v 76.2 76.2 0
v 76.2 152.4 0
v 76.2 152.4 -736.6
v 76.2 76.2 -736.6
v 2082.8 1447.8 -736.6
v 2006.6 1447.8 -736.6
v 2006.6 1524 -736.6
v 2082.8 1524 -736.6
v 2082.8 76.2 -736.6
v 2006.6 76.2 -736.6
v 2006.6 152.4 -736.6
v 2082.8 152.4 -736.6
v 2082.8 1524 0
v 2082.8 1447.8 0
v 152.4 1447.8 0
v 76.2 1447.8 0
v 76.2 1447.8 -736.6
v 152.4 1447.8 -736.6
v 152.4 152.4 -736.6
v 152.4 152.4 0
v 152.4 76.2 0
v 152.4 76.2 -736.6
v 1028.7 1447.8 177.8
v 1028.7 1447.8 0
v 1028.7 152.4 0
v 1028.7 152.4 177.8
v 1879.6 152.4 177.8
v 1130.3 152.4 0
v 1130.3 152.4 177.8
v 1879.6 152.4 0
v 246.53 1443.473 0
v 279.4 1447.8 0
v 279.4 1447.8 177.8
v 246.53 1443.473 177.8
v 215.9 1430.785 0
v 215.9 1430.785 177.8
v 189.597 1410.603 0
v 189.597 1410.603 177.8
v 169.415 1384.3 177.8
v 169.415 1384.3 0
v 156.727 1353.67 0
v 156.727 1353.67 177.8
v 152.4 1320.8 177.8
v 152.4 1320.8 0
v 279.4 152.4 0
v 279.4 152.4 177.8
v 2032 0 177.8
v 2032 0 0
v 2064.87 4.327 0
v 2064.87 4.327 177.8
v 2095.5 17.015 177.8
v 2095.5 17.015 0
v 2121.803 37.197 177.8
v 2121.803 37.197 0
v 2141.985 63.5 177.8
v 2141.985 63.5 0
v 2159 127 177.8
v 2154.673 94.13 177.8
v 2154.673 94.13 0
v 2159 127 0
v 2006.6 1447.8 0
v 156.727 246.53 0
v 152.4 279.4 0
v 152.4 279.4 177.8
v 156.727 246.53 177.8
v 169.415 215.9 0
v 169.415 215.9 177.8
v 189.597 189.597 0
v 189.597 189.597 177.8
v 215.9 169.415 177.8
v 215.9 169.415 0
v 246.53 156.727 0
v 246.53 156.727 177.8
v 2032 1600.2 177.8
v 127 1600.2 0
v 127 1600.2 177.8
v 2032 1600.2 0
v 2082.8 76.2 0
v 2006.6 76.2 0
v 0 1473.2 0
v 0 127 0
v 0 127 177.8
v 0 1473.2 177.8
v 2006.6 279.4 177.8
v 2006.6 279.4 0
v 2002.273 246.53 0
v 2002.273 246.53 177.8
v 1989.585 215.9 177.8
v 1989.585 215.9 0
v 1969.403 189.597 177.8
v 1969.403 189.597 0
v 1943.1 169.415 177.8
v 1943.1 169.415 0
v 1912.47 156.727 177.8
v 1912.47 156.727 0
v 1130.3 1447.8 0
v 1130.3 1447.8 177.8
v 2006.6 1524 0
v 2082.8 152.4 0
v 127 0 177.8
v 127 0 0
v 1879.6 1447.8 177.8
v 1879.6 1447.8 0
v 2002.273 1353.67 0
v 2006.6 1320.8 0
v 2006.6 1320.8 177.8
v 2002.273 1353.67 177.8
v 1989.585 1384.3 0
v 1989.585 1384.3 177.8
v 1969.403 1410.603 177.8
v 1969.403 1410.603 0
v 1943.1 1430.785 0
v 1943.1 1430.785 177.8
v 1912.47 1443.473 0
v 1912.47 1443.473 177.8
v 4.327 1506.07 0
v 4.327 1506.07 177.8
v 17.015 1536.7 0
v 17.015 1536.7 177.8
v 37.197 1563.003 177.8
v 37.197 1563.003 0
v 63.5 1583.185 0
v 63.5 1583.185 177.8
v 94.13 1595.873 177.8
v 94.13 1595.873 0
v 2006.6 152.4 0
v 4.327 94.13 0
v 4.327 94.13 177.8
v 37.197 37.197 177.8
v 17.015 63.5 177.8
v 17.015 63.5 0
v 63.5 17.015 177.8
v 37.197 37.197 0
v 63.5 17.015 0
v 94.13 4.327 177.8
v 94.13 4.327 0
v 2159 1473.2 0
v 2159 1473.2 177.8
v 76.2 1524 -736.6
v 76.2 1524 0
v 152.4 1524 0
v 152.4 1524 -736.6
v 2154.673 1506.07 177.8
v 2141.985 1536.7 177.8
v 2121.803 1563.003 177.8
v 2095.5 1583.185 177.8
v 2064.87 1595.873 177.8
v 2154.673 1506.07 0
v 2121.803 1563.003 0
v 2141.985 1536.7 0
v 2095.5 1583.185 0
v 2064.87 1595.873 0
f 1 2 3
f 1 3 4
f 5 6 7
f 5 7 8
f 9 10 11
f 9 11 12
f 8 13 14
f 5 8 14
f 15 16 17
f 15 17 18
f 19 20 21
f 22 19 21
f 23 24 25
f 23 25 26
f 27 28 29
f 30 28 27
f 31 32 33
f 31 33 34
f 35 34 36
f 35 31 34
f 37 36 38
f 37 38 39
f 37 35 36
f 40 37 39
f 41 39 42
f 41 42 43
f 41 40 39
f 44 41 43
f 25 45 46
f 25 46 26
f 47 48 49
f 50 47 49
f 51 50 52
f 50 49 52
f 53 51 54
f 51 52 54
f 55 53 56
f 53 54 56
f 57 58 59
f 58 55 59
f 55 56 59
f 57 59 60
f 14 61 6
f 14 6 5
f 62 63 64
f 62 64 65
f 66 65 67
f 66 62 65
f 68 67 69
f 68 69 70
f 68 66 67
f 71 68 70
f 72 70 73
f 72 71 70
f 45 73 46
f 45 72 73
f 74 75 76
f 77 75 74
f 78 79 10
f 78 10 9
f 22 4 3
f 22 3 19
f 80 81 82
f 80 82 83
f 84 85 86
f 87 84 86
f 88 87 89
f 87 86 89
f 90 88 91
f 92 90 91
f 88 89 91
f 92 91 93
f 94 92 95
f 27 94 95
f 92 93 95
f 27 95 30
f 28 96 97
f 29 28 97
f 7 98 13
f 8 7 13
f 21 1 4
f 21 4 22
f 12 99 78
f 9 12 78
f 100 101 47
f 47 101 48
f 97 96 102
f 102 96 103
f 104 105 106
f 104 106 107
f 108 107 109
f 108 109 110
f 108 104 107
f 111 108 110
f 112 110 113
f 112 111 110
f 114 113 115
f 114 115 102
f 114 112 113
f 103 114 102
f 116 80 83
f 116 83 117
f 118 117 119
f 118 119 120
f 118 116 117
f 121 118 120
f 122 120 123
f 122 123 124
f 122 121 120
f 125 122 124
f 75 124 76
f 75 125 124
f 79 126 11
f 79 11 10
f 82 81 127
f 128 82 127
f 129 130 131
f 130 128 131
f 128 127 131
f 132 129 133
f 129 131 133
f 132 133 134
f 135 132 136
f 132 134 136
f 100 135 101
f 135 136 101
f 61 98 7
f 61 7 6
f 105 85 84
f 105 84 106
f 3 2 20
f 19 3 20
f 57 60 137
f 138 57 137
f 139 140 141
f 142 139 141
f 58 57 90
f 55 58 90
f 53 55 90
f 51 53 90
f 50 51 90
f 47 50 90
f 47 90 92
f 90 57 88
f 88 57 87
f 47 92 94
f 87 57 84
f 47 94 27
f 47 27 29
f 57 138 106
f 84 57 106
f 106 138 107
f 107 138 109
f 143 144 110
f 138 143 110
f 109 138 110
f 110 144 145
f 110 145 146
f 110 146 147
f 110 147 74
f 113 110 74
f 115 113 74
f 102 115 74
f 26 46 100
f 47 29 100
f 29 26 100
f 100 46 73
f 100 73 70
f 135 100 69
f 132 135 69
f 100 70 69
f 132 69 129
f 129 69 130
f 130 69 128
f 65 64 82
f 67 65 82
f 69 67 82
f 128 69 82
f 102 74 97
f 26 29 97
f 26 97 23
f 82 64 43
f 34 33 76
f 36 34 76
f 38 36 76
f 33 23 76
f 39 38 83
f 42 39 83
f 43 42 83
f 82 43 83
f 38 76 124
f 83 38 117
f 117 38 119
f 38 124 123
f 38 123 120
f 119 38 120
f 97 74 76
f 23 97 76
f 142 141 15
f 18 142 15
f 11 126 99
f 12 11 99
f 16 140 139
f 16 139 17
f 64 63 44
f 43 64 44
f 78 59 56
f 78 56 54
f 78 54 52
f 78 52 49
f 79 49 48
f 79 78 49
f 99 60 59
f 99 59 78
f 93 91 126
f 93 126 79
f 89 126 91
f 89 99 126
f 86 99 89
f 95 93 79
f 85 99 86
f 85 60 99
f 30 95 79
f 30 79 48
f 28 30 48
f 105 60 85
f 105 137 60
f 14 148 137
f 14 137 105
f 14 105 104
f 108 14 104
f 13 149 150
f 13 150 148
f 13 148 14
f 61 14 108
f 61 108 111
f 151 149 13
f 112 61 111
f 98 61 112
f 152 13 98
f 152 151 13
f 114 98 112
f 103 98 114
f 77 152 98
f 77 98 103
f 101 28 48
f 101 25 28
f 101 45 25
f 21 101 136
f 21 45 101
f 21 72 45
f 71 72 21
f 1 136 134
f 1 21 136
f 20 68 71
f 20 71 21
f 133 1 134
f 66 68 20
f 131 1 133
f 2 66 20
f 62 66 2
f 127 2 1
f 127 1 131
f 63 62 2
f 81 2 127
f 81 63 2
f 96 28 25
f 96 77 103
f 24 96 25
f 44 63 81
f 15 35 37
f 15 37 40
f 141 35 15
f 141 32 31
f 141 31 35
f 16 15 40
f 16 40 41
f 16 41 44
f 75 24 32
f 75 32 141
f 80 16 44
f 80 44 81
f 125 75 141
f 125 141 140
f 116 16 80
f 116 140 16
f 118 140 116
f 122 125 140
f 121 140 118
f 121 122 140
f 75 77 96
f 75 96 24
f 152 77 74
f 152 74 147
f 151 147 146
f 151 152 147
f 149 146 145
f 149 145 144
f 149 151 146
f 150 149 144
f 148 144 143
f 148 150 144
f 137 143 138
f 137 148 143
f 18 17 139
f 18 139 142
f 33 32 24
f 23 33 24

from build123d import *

# Parameters (mm, degrees)
F0_W        = 2159
F0_H        = 1600.2
F0_W_2      = 1854.2
F0_H_2      = 1295.4
F1_DEPTH    = 177.8
F2_W        = 76.2
F2_H        = 76.2
F3_DEPTH    = 736.6
F4_T1_DEPTH = 177.8
F4_T3_DEPTH = 812.8
F5_W        = 101.6
F5_H        = 177.8
F6_DEPTH    = 1295.4


# Not quite as in the source:
# - a fillet or chamfer that OpenCascade refuses, or shapes differently, is made with other operations: its cross-section is extruded or revolved along the edge and cut away or added


with BuildPart() as f1:
    # F0 (on Top) → F1 (new body)
    with BuildSketch(Plane.XY):
        with Locations((1079.5, 800.1)):
            Rectangle(F0_W, F0_H)
        with Locations((1079.5, 800.1)):
            Rectangle(F0_W_2, F0_H_2, mode=Mode.SUBTRACT)
    extrude(amount=F1_DEPTH)

    # F2 (on face) → F3 (join)
    with BuildSketch(Plane(origin=(0, 0, 0), x_dir=(1, 0, 0), z_dir=(0, 0, -1))):
        with Locations((114.3, -114.3)):
            Rectangle(F2_W, F2_H)
        with Locations((2044.7, -114.3)):
            Rectangle(F2_W, F2_H)
        with Locations((2044.7, -1485.9)):
            Rectangle(F2_W, F2_H)
        with Locations((114.3, -1485.9)):
            Rectangle(F2_W, F2_H)
    extrude(amount=F3_DEPTH)

    # F4: fillet of radius 127 on 8 edges, made by hand

    # F4_s2 → F4_t1 (join)
    with BuildSketch(Plane.XY):
        with BuildLine():
            ThreePointArc((279.4, 1447.8), (189.5974387893, 1410.6025612107), (152.4, 1320.8))
            Line((152.4, 1320.8), (152.4, 1447.8))
            Line((152.4, 1447.8), (279.4, 1447.8))
        make_face()
        with BuildLine():
            ThreePointArc((2006.6, 1320.8), (1969.4025612107, 1410.6025612107), (1879.6, 1447.8))
            Line((1879.6, 1447.8), (2006.6, 1447.8))
            Line((2006.6, 1447.8), (2006.6, 1320.8))
        make_face()
        with BuildLine():
            ThreePointArc((2006.6, 279.4), (1969.4025612107, 189.5974387893), (1879.6, 152.4))
            Line((1879.6, 152.4), (2006.6, 152.4))
            Line((2006.6, 152.4), (2006.6, 279.4))
        make_face()
        with BuildLine():
            ThreePointArc((152.4, 279.4), (189.5974387893, 189.5974387893), (279.4, 152.4))
            Line((279.4, 152.4), (152.4, 152.4))
            Line((152.4, 152.4), (152.4, 279.4))
        make_face()
    extrude(amount=F4_T1_DEPTH)

    # F4_s4 → F4_t3 (cut)
    with BuildSketch(Plane.XY.offset(-317.5)):
        with BuildLine():
            ThreePointArc((0, 127), (37.1974387893, 37.1974387893), (127, 0))
            Line((127, 0), (0, 0))
            Line((0, 0), (0, 127))
        make_face()
        with BuildLine():
            ThreePointArc((0, 1473.2), (37.1974387893, 1563.0025612107), (127, 1600.2))
            Line((127, 1600.2), (0, 1600.2))
            Line((0, 1600.2), (0, 1473.2))
        make_face()
        with BuildLine():
            ThreePointArc((2032, 0), (2121.8025612107, 37.1974387893), (2159, 127))
            Line((2159, 127), (2159, 0))
            Line((2159, 0), (2032, 0))
        make_face()
        with BuildLine():
            ThreePointArc((2032, 1600.2), (2121.8025612107, 1563.0025612107), (2159, 1473.2))
            Line((2159, 1473.2), (2159, 1600.2))
            Line((2159, 1600.2), (2032, 1600.2))
        make_face()
    extrude(amount=F4_T3_DEPTH, mode=Mode.SUBTRACT)

    # F5 (on face) → F6 (join, through all)
    with BuildSketch(Plane(origin=(0, 152.4, 0), x_dir=(-1, 0, 0), z_dir=(0, 1, 0))):
        with Locations((-1079.5, 88.9)):
            Rectangle(F5_W, F5_H)
    extrude(amount=F6_DEPTH)


solid = f1.part
